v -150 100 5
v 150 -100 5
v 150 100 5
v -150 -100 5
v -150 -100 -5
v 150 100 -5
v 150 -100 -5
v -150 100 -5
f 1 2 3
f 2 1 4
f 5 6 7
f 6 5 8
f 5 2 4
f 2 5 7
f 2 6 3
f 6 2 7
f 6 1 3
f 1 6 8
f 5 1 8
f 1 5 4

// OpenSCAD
// Parameters
plate_length = 300; //[150:600:1]
plate_width = 200; //[100:400:1]
plate_thickness = 10; //[5:20:1]

// Geometry
module tooling_plate_sheet() {
  color("Silver") // Aluminum color
  translate([0, 0, 0]) // Centered position
    cube([plate_length, plate_width, plate_thickness], center=true);
}

// Final Output
tooling_plate_sheet();
